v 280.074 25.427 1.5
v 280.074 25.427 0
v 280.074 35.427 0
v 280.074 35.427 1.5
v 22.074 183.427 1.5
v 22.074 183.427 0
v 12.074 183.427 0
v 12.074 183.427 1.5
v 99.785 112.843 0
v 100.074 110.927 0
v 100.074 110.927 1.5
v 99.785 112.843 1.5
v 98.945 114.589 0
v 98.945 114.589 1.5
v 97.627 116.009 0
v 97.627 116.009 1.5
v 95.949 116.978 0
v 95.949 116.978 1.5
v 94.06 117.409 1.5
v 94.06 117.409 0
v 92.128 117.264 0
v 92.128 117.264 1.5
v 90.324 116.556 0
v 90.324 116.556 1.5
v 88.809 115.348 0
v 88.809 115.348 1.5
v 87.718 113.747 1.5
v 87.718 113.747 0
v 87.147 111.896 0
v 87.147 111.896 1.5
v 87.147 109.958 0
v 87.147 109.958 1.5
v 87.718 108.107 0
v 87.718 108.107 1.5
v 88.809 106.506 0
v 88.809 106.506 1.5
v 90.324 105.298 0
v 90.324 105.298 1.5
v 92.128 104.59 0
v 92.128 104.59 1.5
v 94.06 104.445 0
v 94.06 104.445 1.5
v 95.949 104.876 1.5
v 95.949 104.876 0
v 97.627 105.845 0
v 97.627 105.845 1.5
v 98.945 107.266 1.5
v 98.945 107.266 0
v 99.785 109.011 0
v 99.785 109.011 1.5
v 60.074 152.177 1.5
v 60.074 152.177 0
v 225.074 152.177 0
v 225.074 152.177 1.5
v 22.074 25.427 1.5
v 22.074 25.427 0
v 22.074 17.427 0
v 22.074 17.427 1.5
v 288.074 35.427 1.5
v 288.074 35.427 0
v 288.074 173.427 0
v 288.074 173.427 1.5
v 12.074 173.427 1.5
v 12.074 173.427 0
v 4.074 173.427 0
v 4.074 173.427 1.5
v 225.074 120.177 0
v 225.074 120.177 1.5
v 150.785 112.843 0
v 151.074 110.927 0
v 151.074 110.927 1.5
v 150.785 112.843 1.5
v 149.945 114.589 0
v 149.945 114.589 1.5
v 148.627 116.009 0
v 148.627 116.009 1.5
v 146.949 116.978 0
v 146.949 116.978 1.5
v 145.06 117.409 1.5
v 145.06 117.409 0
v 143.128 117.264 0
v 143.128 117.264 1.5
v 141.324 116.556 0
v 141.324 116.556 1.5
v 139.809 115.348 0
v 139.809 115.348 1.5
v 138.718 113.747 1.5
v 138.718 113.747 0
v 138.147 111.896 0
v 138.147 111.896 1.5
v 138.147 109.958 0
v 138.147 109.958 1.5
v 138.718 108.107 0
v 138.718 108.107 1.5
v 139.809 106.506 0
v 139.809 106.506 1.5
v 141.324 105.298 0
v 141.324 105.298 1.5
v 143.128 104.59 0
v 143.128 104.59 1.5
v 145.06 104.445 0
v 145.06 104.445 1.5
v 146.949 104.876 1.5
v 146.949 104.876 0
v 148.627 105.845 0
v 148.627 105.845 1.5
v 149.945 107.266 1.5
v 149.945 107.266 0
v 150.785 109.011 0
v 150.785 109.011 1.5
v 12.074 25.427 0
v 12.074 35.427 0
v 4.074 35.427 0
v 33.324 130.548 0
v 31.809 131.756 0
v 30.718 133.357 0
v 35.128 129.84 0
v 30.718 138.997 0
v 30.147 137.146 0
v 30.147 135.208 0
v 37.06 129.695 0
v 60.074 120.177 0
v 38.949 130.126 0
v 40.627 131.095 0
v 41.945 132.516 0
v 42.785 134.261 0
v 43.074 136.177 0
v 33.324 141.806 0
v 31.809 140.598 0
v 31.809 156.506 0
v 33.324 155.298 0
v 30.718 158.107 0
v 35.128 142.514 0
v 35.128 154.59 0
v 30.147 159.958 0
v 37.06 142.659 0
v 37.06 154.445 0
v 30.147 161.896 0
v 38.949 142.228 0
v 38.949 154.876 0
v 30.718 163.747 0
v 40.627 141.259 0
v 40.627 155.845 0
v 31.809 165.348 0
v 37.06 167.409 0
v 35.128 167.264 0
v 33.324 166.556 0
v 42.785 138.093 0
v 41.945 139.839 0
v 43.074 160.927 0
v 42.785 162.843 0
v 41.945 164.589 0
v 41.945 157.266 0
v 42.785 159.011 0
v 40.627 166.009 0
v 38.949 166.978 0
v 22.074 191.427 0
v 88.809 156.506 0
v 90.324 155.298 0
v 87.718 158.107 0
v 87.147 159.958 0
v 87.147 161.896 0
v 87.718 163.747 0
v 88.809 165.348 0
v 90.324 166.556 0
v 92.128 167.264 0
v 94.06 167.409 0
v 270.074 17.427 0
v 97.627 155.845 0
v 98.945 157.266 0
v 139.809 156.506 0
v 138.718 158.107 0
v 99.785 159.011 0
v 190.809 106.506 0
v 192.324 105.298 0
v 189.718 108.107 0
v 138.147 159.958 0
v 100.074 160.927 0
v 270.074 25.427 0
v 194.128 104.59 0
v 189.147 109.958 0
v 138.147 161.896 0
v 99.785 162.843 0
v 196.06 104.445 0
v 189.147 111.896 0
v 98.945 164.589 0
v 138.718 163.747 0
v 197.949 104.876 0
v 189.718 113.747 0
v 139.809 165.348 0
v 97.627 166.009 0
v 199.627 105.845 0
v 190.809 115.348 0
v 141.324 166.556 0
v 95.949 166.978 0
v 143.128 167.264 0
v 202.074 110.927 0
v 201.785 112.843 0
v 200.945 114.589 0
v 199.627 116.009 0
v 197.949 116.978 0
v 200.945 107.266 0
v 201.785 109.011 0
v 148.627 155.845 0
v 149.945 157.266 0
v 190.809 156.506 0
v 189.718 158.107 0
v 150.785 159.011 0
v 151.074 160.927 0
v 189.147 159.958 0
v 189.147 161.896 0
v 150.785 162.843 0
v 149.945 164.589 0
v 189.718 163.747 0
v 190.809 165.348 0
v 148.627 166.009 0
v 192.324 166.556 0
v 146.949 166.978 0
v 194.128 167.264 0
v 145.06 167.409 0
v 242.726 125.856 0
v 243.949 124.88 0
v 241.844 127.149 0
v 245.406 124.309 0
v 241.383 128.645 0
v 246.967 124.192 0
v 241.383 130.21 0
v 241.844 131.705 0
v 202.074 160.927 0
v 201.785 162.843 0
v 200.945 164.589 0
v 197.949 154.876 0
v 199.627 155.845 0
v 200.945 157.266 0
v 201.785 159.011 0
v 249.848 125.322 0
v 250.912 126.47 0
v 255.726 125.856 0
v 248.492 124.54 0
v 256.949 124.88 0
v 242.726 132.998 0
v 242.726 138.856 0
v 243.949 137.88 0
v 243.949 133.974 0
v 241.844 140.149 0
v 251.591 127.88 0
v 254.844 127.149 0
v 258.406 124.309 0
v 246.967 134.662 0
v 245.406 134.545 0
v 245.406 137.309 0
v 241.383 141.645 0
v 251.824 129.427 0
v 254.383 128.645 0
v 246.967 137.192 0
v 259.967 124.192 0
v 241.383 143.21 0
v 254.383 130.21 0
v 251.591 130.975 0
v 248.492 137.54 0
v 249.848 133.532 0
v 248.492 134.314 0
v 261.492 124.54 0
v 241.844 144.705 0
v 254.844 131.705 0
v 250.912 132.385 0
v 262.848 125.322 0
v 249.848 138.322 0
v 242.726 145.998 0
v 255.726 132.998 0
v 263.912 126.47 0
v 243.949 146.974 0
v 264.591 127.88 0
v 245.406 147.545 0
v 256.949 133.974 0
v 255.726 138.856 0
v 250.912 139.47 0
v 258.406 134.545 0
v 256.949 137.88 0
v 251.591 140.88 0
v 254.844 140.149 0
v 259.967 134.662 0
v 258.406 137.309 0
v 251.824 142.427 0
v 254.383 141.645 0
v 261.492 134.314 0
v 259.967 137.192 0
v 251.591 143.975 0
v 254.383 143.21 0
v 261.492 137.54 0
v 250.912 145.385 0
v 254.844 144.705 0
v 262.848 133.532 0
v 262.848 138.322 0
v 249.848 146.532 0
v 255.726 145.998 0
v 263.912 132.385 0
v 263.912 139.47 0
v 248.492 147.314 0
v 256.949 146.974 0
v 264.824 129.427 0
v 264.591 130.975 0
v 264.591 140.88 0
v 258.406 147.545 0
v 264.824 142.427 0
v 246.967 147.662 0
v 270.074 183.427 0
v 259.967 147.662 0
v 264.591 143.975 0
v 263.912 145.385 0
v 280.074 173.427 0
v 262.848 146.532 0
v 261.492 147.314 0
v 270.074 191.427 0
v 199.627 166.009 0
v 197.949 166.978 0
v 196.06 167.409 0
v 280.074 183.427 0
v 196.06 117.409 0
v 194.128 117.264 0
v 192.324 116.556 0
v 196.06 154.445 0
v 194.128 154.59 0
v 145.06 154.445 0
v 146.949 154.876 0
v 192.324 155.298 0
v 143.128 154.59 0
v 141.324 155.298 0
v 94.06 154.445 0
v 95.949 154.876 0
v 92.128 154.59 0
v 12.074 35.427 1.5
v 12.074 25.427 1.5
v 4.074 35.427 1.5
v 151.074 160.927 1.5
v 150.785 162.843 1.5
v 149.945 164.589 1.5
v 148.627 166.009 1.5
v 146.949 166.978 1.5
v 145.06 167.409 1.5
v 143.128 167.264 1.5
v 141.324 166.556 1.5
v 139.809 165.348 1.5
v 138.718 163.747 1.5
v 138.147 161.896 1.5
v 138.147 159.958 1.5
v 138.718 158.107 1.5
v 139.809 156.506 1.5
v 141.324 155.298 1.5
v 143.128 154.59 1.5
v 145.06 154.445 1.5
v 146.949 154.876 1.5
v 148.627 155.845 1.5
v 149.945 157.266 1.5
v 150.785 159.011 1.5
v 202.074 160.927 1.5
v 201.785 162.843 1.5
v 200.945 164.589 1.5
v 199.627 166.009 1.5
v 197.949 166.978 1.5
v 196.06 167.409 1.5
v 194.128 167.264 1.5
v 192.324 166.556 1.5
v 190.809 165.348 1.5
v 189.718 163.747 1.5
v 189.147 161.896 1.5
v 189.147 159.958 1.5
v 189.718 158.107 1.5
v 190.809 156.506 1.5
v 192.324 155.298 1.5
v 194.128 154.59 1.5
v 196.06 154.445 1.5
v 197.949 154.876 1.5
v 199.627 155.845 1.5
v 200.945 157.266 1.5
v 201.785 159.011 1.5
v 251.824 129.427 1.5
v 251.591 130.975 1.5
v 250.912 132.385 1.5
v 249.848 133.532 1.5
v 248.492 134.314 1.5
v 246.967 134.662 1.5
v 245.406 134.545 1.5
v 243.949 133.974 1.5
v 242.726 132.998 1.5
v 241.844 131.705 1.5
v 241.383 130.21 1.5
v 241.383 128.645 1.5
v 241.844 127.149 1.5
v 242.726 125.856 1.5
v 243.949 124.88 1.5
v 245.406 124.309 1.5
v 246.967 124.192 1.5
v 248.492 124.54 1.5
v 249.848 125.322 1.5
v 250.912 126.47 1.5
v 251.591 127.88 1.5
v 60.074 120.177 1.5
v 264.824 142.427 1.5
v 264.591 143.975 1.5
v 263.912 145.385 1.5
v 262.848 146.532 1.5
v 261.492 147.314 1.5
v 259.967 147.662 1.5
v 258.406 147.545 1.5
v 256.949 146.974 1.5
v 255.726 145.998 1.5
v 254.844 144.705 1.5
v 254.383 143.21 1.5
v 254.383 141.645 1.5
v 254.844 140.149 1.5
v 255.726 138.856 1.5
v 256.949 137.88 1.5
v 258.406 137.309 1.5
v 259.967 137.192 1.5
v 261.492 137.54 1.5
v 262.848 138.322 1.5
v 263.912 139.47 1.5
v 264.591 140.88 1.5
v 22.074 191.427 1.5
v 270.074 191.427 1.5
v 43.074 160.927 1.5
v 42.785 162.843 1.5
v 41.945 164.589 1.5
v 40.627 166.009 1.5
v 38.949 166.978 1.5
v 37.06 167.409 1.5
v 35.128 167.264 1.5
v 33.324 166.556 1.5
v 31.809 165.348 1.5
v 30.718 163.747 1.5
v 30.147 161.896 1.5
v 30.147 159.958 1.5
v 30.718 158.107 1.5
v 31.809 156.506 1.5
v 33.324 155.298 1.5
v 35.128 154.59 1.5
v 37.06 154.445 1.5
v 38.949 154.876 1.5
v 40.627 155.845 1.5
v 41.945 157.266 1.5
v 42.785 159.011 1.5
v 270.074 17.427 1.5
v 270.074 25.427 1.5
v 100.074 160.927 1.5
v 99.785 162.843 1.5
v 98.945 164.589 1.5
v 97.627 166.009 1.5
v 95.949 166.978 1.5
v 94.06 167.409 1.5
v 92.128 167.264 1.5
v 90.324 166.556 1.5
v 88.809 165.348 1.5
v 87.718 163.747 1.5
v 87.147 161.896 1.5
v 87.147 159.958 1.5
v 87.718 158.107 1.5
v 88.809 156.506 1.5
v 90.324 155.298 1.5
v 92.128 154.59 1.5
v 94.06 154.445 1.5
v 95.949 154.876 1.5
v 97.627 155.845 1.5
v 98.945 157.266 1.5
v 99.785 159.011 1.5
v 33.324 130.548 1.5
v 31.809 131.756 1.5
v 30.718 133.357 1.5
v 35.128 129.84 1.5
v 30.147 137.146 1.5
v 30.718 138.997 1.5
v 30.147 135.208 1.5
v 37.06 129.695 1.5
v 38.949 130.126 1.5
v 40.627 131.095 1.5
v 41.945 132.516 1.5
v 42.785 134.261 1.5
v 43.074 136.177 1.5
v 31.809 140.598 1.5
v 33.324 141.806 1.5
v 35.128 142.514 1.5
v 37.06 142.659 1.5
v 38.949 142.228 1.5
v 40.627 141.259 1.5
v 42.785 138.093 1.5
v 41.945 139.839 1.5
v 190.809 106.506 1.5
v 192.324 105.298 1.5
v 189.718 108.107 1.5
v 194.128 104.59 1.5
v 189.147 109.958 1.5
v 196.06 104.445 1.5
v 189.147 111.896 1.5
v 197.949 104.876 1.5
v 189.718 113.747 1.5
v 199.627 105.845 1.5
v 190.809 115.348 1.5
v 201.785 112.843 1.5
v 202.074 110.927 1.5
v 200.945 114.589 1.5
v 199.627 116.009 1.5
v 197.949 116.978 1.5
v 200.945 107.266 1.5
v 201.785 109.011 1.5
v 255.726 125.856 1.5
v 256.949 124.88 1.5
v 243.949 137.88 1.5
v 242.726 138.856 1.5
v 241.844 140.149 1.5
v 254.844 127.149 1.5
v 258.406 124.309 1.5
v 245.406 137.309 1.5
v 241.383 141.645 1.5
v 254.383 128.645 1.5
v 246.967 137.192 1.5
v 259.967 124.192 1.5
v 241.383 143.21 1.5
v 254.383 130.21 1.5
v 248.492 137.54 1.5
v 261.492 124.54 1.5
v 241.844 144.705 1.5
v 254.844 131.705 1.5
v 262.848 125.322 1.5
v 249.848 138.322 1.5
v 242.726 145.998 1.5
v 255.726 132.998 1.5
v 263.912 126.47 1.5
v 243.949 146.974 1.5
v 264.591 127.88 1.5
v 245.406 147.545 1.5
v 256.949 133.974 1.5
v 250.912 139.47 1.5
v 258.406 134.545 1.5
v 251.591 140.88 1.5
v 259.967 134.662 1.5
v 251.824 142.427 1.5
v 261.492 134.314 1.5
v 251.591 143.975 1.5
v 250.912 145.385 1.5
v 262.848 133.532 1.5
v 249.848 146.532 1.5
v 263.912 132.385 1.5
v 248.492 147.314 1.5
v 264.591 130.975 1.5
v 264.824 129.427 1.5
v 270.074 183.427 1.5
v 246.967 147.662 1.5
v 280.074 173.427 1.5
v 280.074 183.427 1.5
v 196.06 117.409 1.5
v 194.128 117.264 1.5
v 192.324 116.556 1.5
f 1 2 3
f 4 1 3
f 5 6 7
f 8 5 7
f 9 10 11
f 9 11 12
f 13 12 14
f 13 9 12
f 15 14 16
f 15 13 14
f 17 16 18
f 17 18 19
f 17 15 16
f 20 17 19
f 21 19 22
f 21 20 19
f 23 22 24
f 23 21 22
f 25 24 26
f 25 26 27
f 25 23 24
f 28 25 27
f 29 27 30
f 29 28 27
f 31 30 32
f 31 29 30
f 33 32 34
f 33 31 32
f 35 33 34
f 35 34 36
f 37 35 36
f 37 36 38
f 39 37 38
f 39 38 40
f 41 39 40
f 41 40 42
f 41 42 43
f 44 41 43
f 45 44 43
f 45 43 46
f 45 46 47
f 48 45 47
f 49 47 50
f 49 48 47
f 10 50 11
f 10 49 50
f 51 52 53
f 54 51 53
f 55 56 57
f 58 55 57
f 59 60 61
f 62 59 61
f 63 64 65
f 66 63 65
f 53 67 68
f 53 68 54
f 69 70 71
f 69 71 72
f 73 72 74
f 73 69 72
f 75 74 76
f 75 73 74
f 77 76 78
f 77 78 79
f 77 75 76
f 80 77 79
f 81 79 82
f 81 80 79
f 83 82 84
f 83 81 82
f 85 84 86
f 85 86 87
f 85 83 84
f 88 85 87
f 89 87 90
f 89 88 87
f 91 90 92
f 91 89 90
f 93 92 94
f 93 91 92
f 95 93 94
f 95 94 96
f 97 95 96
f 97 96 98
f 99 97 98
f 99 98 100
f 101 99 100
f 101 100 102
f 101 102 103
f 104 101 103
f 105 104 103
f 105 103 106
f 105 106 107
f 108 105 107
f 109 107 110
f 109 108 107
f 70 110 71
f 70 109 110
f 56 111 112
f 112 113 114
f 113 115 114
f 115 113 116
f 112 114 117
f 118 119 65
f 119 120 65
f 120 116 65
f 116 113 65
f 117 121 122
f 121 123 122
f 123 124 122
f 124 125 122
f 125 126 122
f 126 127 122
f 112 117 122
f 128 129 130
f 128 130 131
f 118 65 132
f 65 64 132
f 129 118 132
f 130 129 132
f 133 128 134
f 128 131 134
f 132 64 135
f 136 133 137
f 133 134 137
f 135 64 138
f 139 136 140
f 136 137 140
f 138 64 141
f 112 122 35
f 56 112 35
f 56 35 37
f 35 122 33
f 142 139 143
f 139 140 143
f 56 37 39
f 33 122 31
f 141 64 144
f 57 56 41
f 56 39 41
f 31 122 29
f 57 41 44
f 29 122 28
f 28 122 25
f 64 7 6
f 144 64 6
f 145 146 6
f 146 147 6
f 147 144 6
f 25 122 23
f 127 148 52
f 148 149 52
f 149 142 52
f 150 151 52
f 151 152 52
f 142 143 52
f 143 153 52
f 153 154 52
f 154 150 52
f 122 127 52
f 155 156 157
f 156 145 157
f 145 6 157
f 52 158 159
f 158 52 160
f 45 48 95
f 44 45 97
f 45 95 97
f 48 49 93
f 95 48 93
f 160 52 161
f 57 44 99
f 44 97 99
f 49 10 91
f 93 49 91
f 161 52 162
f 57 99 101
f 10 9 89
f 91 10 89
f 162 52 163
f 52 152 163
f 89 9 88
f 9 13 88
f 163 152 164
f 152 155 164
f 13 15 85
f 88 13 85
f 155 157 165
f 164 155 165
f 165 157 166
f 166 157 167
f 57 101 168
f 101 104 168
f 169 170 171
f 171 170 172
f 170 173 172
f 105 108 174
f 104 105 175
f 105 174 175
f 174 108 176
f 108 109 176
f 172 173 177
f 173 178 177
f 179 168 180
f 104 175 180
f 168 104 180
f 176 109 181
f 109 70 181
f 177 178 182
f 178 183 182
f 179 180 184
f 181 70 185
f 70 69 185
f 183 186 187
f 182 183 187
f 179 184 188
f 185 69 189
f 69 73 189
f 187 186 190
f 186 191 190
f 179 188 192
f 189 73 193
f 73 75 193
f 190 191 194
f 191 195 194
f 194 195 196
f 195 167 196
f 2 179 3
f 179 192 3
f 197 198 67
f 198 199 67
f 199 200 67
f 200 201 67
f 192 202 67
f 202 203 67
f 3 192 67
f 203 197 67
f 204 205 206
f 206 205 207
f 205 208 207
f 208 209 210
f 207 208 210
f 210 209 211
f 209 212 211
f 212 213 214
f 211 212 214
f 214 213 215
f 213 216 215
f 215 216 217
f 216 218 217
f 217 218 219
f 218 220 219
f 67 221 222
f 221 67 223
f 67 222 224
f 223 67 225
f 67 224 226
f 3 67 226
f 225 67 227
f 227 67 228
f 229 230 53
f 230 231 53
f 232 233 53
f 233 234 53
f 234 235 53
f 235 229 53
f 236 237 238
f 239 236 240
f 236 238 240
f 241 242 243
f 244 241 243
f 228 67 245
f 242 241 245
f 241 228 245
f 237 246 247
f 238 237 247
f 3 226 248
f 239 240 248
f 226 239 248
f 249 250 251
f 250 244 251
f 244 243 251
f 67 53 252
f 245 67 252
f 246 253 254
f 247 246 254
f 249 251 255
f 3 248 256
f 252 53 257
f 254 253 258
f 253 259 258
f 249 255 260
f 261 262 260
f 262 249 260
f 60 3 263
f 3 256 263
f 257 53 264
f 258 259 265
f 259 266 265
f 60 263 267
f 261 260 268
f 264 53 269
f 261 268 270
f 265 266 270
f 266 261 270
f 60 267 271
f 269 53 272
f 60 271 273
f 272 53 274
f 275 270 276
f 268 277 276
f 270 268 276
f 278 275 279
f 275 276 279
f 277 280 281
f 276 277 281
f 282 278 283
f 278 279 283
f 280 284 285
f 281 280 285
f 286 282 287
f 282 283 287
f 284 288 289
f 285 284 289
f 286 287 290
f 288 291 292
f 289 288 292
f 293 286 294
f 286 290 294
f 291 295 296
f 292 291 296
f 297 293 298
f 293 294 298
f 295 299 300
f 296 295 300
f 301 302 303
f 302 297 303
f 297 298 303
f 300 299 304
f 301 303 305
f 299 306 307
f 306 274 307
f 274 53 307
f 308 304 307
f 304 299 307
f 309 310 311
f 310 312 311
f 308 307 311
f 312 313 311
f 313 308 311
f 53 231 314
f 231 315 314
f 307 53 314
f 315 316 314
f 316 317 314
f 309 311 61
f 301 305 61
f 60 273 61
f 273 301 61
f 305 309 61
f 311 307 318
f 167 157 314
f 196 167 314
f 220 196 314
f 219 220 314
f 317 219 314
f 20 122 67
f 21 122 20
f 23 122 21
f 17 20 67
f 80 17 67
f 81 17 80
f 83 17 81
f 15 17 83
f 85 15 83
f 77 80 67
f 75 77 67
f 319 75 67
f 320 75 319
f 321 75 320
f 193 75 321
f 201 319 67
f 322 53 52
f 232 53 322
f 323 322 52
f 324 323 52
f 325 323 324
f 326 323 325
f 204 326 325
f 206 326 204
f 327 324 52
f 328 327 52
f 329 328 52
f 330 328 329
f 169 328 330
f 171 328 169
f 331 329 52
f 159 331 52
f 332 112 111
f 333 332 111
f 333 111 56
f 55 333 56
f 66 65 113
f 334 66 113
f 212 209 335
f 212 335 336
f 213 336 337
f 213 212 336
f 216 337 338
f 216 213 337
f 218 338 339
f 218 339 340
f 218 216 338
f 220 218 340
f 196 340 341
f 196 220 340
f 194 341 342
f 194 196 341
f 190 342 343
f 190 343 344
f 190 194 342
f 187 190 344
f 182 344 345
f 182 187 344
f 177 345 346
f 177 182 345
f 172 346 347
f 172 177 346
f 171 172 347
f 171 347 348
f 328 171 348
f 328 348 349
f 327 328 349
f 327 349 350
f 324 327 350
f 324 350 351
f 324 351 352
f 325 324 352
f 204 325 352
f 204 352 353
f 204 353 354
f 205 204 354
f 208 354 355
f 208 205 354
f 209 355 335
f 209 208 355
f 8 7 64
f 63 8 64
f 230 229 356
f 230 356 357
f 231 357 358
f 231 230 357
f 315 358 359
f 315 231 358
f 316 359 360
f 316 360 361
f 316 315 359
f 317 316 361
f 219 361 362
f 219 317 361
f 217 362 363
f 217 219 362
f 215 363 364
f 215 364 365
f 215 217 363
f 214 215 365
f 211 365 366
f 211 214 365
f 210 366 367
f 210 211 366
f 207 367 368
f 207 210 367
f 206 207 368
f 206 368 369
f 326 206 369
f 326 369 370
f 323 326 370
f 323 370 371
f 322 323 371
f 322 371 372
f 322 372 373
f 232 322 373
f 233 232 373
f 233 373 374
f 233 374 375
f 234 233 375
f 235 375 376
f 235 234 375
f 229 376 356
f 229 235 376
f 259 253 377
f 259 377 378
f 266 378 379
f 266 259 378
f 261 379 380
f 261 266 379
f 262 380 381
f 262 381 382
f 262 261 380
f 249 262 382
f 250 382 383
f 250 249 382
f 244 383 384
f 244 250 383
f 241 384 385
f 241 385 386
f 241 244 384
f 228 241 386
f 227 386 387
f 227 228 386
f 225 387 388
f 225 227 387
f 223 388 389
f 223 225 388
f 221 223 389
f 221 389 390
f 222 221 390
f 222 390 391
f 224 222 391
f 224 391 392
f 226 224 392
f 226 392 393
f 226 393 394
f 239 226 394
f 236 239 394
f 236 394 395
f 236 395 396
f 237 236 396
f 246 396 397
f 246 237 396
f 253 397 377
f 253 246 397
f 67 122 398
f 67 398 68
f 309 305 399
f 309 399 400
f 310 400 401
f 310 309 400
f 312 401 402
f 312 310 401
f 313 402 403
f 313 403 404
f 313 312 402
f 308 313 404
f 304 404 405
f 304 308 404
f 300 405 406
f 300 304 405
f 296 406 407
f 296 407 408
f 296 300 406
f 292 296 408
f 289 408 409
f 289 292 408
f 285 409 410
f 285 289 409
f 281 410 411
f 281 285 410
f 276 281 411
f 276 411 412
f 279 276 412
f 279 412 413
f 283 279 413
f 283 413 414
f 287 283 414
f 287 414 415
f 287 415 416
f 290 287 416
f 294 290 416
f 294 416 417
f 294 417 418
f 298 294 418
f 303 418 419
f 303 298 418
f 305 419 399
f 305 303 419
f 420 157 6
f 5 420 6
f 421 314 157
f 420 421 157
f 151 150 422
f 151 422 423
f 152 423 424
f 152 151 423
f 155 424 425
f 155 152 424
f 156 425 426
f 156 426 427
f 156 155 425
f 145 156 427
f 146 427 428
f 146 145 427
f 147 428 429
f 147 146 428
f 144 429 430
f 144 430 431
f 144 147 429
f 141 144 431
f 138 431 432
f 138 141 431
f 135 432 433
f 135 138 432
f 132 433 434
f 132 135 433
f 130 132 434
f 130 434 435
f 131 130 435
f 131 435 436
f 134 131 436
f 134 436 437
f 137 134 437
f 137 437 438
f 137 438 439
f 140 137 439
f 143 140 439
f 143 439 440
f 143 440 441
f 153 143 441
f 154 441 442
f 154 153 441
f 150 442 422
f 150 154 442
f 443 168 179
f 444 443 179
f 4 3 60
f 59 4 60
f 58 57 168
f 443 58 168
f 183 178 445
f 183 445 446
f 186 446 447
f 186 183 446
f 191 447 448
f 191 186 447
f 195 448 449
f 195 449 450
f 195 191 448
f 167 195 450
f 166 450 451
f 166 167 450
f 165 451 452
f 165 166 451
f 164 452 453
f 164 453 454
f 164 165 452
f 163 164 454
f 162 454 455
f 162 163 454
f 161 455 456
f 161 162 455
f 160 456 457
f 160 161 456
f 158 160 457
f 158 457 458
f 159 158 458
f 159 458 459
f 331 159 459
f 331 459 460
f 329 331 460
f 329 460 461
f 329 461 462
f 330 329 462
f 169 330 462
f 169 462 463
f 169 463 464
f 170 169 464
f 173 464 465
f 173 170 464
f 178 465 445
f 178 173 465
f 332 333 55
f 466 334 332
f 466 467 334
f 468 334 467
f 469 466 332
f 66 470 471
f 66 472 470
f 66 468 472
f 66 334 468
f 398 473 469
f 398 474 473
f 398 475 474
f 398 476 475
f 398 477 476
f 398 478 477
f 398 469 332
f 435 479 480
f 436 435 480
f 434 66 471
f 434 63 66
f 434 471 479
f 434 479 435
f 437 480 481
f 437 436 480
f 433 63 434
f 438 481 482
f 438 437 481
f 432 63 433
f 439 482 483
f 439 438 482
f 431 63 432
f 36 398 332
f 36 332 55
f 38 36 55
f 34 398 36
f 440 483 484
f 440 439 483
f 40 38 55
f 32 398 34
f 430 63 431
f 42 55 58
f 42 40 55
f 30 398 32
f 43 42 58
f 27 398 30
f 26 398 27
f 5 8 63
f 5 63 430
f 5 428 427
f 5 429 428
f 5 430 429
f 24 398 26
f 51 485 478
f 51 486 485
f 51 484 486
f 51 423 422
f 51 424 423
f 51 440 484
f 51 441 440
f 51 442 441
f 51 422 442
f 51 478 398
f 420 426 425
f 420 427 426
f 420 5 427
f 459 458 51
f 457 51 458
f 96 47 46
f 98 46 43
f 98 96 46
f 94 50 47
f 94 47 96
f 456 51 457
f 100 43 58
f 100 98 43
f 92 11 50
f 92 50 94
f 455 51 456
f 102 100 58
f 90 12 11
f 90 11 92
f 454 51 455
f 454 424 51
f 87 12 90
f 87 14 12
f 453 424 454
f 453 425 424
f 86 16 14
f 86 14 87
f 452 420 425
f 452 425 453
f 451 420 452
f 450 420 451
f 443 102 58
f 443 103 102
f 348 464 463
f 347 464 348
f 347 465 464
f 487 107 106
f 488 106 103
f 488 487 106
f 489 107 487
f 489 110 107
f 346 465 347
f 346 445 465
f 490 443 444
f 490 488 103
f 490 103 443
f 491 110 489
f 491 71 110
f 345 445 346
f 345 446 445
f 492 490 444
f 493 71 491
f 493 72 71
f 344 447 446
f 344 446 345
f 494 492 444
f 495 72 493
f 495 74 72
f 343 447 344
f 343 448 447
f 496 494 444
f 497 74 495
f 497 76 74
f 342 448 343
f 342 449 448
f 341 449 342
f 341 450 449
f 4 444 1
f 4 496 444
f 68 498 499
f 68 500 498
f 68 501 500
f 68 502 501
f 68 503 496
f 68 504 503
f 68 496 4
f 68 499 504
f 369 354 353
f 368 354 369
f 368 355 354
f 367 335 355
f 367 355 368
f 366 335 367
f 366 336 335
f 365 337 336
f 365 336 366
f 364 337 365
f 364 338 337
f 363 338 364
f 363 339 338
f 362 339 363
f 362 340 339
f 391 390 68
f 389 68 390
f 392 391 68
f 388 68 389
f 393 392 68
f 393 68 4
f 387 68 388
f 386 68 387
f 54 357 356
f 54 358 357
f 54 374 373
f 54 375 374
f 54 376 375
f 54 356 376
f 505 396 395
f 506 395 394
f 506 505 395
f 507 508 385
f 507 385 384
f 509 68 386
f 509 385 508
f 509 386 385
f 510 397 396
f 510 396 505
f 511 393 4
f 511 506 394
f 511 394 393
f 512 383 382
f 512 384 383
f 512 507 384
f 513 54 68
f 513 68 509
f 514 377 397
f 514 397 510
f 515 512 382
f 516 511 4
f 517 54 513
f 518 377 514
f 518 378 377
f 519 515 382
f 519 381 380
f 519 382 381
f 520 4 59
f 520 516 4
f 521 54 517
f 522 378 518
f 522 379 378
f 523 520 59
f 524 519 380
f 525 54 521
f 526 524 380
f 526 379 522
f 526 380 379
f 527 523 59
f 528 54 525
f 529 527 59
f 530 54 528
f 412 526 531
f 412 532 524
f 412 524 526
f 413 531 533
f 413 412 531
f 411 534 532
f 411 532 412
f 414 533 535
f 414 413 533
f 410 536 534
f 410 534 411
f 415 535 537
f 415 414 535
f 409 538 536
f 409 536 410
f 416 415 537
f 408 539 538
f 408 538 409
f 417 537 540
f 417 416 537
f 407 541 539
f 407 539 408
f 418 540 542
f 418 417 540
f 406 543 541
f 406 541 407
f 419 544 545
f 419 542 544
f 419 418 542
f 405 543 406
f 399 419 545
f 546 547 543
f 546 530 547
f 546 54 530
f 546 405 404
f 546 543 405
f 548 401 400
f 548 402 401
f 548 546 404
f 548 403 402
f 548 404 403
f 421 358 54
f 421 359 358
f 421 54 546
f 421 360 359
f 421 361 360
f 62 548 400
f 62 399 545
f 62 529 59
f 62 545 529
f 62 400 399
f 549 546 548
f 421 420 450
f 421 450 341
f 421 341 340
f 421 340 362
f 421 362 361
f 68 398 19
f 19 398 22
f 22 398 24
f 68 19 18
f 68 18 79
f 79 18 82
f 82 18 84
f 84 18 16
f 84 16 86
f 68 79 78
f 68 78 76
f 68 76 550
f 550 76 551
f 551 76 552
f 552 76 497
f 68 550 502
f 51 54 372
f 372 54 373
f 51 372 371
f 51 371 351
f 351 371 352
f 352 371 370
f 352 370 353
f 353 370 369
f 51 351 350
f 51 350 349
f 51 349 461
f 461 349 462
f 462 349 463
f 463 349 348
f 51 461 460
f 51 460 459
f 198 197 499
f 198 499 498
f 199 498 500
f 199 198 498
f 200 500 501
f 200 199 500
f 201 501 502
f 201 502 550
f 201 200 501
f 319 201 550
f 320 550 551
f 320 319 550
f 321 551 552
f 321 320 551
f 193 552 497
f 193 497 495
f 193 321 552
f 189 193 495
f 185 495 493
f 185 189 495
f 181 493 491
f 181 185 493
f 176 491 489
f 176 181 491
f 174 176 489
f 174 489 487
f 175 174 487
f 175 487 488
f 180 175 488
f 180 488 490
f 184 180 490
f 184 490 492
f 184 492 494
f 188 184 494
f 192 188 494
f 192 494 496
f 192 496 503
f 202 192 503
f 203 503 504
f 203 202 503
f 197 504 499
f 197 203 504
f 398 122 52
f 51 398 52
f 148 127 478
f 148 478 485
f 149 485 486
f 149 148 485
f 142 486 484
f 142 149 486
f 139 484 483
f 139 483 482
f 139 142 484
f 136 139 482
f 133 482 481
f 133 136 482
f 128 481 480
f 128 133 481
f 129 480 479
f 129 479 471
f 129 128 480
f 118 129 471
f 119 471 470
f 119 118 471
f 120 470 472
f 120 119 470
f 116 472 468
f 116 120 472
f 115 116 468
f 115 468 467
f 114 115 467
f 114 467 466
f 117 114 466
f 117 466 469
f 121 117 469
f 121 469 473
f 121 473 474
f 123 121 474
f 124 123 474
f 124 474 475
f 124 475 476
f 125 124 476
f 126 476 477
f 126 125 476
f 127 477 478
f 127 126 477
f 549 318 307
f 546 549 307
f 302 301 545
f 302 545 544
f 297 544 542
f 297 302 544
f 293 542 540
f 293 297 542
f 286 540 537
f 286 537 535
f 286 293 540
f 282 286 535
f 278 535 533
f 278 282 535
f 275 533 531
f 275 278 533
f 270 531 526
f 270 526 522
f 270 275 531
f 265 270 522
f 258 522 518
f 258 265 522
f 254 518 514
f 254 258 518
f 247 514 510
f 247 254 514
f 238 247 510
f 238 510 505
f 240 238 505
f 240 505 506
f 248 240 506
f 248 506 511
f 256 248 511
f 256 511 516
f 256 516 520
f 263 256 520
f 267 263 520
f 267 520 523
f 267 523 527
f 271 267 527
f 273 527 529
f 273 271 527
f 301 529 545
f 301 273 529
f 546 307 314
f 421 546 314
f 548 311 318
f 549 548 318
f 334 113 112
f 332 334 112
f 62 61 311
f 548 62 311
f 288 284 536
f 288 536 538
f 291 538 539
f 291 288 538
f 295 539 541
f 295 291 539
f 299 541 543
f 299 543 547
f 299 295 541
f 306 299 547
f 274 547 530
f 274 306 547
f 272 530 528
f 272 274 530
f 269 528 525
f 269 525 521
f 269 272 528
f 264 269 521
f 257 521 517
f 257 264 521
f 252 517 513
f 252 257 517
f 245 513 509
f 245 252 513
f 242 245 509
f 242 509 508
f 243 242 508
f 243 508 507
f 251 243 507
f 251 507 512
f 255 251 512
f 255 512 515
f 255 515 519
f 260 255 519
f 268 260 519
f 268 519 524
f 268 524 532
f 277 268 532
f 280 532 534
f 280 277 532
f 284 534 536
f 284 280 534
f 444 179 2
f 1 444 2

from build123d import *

# Parameters (mm, degrees)
MODEL_R                  = 6.5
MODEL_R_2                = 5.25
MODEL_W                  = 165
MODEL_H                  = 32
RESSALTO_EXTRUS_O1_DEPTH = 1.5


with BuildPart() as part:
    # Model → Ressalto-extrusão1 (new body)
    with BuildSketch(Plane.XY):
        Polygon((270.074227849, 25.427113901), (280.074227849, 25.427113901), (280.074227849, 35.427113901), (288.074227849, 35.427113901), (288.074227849, 173.427113901), (280.074227849, 173.427113901), (280.074227849, 183.427113901), (270.074227849, 183.427113901), (270.074227849, 191.427113901), (22.074227849, 191.427113901), (22.074227849, 183.427113901), (12.074227849, 183.427113901), (12.074227849, 173.427113901), (4.074227849, 173.427113901), (4.074227849, 35.427113901), (12.074227849, 35.427113901), (12.074227849, 25.427113901), (22.074227849, 25.427113901), (22.074227849, 17.427113901), (270.074227849, 17.427113901), align=None)
        with Locations((36.574227849, 160.927113901)):
            Circle(MODEL_R, mode=Mode.SUBTRACT)
        with Locations((36.574227849, 136.177113901)):
            Circle(MODEL_R, mode=Mode.SUBTRACT)
        with Locations((93.574227849, 110.927113901)):
            Circle(MODEL_R, mode=Mode.SUBTRACT)
        with Locations((144.574227849, 110.927113901)):
            Circle(MODEL_R, mode=Mode.SUBTRACT)
        with Locations((195.574227849, 110.927113901)):
            Circle(MODEL_R, mode=Mode.SUBTRACT)
        with Locations((195.574227849, 160.927113901)):
            Circle(MODEL_R, mode=Mode.SUBTRACT)
        with Locations((144.574227849, 160.927113901)):
            Circle(MODEL_R, mode=Mode.SUBTRACT)
        with Locations((93.574227849, 160.927113901)):
            Circle(MODEL_R, mode=Mode.SUBTRACT)
        with Locations((246.574227849, 142.427113901)):
            Circle(MODEL_R_2, mode=Mode.SUBTRACT)
        with Locations((259.574227849, 142.427113901)):
            Circle(MODEL_R_2, mode=Mode.SUBTRACT)
        with Locations((259.574227849, 129.427113901)):
            Circle(MODEL_R_2, mode=Mode.SUBTRACT)
        with Locations((246.574227849, 129.427113901)):
            Circle(MODEL_R_2, mode=Mode.SUBTRACT)
        with Locations((142.574227849, 136.177113901)):
            Rectangle(MODEL_W, MODEL_H, mode=Mode.SUBTRACT)
    extrude(amount=RESSALTO_EXTRUS_O1_DEPTH)


solid = part.part
